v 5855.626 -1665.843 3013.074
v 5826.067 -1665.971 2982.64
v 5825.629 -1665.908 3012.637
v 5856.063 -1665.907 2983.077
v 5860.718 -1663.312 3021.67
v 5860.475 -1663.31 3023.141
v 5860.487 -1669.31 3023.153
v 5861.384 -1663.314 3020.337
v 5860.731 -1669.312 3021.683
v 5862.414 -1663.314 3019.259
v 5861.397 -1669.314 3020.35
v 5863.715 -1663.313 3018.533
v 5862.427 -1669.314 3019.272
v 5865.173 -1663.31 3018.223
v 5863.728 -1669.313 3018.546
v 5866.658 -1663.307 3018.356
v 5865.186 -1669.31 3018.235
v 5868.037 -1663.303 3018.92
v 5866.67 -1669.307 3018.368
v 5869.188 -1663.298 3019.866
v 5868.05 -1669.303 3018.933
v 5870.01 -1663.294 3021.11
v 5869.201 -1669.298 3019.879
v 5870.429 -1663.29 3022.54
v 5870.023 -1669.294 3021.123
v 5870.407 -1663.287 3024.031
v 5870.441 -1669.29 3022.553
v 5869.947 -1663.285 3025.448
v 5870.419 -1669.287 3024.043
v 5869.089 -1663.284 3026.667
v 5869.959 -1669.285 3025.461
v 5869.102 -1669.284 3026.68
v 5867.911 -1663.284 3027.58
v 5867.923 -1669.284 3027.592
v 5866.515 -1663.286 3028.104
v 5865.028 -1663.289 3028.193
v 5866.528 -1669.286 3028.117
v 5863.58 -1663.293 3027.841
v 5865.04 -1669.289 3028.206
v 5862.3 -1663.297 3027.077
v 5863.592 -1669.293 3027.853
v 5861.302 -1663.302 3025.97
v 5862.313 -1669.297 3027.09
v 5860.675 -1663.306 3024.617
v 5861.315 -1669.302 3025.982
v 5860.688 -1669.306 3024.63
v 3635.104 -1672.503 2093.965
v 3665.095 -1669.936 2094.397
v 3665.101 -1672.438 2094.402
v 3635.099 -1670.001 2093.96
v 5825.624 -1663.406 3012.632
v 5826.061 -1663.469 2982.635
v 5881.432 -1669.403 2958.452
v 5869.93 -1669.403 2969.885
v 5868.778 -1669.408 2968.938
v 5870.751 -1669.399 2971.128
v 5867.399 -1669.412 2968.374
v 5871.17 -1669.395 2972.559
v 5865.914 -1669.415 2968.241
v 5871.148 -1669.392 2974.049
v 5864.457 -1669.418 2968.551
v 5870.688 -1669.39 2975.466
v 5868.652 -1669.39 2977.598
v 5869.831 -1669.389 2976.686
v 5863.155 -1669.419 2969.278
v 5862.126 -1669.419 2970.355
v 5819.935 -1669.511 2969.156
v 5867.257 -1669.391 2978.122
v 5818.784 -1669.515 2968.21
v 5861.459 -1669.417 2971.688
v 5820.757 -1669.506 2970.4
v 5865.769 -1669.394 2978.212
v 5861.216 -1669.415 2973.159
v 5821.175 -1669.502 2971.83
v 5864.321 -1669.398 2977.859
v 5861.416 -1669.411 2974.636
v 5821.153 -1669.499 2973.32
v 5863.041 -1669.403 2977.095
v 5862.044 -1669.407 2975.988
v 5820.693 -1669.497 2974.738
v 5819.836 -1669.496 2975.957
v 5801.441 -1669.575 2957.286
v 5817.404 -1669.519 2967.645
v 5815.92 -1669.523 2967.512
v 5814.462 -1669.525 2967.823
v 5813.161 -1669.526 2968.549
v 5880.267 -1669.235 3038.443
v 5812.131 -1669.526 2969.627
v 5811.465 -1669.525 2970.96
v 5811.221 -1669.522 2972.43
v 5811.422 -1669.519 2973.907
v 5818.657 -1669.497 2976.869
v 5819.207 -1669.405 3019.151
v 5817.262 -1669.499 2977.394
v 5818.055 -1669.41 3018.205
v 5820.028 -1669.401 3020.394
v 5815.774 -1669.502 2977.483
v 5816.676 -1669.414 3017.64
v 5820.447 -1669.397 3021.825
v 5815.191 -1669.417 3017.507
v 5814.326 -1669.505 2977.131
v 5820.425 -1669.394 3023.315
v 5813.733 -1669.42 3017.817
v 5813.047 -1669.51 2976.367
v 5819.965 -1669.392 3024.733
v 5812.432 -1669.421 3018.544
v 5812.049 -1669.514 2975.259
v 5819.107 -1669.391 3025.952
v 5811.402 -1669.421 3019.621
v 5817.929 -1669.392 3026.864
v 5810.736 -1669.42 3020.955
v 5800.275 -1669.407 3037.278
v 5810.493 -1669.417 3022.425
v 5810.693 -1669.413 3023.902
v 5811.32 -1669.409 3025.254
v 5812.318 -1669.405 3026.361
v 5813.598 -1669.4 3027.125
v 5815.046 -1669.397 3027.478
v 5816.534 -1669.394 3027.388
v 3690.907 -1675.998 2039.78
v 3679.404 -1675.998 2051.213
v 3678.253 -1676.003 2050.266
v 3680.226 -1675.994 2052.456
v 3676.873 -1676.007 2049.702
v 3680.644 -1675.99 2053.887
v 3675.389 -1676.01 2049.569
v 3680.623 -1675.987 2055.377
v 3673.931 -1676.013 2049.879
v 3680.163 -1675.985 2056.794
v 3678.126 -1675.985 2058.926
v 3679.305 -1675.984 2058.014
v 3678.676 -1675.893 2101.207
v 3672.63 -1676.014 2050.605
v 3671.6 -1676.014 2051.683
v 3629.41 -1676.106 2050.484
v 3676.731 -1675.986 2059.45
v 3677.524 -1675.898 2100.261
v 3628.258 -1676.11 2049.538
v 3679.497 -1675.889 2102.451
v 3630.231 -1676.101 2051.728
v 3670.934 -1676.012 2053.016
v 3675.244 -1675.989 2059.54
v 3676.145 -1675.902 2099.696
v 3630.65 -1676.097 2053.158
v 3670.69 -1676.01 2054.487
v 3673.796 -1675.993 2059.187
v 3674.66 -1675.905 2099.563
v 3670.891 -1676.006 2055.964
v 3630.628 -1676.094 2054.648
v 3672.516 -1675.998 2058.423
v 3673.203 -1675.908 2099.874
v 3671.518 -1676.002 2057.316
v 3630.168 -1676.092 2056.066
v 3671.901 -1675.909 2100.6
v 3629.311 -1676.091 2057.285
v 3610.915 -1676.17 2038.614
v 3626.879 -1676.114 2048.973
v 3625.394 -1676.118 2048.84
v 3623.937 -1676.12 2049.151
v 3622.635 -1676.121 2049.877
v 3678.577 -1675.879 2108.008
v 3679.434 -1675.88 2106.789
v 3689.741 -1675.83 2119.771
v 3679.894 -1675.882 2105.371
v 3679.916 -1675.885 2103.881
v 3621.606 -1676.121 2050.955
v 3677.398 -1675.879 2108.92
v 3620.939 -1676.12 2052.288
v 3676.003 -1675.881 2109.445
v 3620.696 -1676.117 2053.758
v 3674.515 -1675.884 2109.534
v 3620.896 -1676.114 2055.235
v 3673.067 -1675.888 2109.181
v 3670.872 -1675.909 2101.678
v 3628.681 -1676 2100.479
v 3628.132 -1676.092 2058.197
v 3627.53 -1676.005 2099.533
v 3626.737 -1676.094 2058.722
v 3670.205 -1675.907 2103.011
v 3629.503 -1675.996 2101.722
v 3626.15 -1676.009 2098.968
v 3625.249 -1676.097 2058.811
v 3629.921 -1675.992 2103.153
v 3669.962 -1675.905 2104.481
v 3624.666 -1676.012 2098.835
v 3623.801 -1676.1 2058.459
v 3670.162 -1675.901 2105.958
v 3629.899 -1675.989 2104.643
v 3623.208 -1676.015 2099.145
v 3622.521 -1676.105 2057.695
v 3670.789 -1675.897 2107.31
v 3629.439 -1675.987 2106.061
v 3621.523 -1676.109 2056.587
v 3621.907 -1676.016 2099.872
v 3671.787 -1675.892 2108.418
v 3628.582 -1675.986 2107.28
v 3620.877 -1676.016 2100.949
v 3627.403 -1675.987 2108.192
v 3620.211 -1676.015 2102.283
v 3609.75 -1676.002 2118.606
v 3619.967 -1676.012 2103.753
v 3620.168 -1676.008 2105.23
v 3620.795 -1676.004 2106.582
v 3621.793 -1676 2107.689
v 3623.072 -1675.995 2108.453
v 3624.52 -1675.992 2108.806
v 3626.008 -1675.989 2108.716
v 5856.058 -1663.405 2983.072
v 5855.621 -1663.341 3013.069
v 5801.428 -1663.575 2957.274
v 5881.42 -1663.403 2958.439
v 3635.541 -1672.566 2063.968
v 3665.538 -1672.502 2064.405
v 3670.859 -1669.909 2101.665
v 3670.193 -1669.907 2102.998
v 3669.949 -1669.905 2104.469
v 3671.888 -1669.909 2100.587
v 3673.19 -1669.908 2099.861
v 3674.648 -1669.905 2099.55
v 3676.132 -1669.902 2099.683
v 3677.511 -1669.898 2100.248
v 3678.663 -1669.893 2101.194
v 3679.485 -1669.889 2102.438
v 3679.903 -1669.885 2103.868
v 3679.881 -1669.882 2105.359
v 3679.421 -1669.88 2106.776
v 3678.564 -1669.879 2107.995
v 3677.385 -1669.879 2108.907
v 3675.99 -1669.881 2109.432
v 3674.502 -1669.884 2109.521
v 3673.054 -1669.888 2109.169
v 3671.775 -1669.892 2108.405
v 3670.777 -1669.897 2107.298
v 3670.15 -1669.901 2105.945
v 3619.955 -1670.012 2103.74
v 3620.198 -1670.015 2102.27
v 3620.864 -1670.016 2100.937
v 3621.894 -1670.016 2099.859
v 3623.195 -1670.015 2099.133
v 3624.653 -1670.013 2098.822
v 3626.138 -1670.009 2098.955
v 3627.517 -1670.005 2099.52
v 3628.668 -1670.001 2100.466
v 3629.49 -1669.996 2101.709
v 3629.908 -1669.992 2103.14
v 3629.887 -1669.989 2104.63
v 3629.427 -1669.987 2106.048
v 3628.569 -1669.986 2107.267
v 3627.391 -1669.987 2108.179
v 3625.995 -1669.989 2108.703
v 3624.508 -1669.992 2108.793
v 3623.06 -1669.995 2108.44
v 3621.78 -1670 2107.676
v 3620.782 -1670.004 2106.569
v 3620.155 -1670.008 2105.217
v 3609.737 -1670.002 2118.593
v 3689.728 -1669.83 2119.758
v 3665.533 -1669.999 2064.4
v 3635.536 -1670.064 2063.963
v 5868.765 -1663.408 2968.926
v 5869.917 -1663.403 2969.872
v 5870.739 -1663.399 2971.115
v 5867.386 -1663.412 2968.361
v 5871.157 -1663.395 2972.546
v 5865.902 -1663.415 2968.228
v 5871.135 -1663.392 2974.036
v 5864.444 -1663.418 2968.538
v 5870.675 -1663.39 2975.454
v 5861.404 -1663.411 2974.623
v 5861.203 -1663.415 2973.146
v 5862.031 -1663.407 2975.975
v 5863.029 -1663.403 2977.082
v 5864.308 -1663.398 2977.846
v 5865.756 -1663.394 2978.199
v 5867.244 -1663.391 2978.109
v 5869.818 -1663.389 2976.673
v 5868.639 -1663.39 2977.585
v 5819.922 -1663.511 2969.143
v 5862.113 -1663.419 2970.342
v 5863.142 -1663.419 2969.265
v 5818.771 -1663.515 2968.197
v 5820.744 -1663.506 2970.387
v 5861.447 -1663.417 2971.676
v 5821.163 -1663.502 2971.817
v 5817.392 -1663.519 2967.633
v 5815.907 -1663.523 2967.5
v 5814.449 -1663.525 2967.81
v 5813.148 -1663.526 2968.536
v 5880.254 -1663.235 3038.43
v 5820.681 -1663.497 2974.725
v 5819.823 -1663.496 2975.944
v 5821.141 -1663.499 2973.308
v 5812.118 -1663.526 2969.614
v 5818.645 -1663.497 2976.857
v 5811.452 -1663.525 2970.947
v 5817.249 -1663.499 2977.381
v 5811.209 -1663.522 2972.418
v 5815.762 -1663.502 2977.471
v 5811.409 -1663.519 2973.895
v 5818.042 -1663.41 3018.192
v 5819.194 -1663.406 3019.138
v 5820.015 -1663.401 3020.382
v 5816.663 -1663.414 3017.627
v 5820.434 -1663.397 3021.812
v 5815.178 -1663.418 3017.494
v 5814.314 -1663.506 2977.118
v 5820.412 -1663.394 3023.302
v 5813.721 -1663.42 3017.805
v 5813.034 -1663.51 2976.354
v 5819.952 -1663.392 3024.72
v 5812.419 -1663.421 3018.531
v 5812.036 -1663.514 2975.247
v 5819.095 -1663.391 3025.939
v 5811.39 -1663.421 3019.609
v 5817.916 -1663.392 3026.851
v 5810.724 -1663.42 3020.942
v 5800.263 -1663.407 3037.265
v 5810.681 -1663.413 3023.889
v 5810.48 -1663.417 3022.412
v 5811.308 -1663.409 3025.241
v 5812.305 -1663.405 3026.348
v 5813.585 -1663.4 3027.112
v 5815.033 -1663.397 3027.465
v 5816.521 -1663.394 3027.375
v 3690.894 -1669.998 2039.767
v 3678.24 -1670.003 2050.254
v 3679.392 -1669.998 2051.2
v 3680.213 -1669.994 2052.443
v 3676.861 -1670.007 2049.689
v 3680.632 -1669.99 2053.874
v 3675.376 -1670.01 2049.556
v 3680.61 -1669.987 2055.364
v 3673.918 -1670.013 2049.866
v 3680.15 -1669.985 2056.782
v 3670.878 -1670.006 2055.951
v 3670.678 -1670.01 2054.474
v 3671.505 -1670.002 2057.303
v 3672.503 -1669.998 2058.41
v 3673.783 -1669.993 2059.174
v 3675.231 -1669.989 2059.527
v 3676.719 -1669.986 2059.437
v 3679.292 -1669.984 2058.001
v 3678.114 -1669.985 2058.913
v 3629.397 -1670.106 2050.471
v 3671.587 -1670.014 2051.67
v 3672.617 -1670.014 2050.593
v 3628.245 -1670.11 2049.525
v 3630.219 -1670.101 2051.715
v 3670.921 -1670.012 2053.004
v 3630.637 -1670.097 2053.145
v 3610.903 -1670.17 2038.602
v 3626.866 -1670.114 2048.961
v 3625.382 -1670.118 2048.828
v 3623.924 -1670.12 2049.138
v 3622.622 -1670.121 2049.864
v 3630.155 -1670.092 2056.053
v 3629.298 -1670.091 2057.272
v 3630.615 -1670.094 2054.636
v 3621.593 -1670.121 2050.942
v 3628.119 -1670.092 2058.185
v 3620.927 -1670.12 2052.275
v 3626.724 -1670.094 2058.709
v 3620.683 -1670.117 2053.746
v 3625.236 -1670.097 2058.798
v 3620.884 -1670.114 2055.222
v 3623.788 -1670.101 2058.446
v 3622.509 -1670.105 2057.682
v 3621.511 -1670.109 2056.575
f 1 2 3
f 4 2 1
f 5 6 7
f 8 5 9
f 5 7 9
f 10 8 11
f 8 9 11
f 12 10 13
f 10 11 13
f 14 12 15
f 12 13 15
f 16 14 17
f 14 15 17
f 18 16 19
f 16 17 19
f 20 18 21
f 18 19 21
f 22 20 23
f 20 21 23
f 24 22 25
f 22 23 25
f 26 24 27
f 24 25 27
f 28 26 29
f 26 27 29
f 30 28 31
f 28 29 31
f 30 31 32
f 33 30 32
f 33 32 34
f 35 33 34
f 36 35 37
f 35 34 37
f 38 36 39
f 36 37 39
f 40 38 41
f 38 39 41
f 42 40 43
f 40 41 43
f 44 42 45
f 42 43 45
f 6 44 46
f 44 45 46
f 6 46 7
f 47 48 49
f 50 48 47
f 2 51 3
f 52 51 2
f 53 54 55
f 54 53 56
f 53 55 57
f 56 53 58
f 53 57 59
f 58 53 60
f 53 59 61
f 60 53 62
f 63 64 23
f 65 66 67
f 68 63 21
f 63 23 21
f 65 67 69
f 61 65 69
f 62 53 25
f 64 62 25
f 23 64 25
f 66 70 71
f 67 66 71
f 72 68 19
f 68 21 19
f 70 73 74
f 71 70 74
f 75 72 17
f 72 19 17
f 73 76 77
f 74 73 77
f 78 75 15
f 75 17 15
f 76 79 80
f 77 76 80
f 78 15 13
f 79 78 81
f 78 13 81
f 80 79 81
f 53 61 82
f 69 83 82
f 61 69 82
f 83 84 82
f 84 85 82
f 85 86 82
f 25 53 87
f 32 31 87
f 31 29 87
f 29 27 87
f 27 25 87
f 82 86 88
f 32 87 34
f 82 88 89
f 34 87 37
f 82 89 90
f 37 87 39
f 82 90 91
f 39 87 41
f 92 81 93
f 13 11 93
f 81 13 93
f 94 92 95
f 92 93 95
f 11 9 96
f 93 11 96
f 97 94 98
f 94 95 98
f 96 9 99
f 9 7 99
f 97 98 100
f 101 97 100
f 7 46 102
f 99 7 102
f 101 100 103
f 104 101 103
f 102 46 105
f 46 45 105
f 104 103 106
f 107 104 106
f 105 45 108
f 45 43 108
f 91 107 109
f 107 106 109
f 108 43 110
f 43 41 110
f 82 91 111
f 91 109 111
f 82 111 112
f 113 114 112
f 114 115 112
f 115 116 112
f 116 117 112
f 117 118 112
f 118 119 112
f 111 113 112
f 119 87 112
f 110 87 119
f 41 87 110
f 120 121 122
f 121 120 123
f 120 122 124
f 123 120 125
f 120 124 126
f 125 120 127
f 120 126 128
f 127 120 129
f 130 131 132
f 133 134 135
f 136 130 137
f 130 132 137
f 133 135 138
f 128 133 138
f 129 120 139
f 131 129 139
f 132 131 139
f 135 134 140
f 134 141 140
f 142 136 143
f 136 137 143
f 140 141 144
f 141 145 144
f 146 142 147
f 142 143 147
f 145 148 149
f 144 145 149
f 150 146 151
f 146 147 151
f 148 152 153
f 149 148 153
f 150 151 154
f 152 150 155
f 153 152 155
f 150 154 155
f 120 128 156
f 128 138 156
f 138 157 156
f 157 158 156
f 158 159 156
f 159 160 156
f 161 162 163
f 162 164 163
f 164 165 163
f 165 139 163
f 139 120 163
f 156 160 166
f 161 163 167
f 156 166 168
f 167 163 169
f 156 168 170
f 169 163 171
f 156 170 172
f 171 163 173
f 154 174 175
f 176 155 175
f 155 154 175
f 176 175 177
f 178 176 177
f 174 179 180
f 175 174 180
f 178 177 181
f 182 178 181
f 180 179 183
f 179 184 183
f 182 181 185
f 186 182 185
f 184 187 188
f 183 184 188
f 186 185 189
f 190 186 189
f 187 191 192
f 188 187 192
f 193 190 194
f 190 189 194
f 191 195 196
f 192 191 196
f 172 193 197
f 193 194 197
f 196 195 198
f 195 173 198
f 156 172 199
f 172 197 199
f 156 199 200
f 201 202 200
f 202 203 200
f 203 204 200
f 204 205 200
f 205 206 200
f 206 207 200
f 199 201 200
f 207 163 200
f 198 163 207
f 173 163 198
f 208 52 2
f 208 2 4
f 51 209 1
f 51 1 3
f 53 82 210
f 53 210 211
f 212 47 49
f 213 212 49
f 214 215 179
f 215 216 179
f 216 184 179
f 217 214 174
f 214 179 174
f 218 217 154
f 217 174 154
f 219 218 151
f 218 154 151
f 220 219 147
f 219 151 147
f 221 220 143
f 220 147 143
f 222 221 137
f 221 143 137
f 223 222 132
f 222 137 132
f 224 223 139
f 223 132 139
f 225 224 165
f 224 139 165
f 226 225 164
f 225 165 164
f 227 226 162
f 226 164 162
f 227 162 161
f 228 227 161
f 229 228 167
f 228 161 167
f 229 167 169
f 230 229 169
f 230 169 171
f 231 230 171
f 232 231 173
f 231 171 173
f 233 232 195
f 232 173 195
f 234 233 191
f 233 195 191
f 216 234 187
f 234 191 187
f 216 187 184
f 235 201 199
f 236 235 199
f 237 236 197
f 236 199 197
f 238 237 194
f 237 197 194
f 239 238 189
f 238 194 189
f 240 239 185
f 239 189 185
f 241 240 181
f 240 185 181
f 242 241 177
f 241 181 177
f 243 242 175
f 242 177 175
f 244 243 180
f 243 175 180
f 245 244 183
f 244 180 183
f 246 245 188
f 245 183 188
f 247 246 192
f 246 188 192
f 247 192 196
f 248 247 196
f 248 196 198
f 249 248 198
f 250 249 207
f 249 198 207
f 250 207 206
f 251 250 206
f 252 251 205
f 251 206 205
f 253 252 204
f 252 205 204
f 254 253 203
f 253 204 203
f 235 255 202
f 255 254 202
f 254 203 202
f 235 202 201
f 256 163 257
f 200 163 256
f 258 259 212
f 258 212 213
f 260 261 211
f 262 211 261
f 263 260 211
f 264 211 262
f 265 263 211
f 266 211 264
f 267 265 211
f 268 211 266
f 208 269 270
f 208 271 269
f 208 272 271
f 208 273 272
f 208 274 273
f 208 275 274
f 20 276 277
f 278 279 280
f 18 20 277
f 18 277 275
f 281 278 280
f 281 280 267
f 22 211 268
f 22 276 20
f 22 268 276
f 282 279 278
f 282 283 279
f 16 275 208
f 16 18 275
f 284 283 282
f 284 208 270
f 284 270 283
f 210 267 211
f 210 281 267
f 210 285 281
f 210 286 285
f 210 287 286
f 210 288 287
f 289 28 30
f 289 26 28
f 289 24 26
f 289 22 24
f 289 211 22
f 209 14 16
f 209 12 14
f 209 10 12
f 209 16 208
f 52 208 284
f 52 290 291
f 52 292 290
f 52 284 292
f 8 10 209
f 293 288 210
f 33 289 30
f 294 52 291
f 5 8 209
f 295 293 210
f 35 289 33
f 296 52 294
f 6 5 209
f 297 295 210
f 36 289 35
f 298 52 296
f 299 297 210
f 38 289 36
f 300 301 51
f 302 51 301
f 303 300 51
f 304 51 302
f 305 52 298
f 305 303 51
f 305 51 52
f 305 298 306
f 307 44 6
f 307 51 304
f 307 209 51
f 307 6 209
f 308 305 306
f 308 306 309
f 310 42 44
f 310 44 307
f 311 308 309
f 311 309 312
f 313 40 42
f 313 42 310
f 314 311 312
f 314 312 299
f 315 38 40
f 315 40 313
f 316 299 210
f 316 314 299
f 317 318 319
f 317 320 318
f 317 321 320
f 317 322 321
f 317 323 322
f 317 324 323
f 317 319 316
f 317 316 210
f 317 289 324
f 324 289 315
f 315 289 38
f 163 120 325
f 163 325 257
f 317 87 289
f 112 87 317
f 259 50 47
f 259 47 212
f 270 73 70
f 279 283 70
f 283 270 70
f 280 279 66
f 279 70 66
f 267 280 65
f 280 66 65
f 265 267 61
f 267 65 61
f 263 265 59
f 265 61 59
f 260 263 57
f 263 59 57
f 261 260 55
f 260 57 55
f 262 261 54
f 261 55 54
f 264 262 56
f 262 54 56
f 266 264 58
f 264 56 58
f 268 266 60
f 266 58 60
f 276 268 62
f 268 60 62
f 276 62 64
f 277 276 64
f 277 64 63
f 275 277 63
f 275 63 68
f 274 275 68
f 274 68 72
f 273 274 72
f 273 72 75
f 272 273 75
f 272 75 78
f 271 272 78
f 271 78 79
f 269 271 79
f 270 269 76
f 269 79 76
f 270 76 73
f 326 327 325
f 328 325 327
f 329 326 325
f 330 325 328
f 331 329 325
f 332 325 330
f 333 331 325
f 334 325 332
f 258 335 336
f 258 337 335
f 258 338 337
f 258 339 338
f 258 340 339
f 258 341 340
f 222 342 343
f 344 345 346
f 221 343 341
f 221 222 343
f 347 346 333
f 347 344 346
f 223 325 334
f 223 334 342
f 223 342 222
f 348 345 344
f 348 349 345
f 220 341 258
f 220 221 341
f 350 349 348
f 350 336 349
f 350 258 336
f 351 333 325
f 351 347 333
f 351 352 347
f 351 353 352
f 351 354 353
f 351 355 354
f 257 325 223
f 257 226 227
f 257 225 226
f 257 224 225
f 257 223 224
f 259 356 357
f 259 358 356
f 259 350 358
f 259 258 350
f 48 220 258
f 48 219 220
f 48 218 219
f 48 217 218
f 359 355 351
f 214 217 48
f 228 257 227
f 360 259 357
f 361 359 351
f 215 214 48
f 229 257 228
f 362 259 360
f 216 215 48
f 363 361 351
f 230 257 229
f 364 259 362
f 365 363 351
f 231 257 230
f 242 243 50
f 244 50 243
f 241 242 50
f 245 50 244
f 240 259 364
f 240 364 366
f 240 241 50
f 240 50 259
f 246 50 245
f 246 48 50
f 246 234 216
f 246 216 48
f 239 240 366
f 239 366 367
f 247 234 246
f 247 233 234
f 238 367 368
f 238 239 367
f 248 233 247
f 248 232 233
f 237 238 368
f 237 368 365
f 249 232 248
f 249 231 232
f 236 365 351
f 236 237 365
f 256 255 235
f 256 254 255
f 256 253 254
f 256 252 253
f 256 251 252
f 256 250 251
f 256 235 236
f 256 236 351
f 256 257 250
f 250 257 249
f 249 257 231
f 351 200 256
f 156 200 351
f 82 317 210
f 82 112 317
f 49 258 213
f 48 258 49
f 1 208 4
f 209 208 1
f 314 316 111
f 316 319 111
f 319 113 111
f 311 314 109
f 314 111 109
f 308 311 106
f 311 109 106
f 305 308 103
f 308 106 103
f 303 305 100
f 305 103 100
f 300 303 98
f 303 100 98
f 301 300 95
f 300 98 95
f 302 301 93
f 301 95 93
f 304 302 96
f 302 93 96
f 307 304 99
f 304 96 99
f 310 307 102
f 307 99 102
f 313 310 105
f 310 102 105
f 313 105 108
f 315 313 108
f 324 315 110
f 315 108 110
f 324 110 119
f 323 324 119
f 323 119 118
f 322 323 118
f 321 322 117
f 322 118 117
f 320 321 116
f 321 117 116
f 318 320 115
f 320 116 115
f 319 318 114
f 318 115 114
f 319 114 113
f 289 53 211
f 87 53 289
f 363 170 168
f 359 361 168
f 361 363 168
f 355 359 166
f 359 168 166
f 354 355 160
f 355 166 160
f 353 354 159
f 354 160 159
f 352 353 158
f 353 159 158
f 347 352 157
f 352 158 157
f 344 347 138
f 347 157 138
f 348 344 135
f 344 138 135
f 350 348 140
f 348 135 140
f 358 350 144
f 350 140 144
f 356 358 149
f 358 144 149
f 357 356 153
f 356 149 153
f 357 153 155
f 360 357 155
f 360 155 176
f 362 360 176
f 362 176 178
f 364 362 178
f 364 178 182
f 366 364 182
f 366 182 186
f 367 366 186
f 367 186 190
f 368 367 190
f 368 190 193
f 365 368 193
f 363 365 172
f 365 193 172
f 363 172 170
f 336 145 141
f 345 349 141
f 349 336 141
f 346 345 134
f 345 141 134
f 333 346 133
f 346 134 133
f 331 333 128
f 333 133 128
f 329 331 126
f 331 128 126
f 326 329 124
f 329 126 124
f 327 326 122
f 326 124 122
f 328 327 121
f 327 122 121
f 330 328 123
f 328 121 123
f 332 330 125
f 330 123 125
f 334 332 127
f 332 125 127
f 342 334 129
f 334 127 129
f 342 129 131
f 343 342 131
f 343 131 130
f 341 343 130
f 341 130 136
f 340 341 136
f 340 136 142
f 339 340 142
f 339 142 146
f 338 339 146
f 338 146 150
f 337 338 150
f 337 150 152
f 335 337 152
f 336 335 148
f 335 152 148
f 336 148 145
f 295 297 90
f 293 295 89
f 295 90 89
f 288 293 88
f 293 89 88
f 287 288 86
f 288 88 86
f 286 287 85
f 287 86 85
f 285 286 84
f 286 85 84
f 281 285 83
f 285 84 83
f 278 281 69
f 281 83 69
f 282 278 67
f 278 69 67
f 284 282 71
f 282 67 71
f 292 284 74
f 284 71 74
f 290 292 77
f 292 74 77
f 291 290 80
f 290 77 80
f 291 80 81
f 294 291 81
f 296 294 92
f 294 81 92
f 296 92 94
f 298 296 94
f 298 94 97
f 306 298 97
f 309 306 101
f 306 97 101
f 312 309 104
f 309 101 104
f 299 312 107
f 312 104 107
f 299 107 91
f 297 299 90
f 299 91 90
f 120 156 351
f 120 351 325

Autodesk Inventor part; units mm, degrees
ref_plane "YZ Plane" through (0, 0, 0) normal (1, 0, 0) x (0, 1, 0)
ref_plane "XZ Plane" through (0, 0, 0) normal (0, 1, 0) x (-1, 0, 0)
ref_plane "XY Plane" through (0, 0, 0) normal (0, 0, 1) x (1, 0, 0)
ref_plane "Plano de trabajo1" through (5045.3695, -1674.7645, 1275.4449) normal (-0.0021155, 0.9999955, -0.0021345) x (-0.9998916, -0.0021464, -0.0145673)
sketch "Boceto1" plane through (5045.3695, -1674.7645, 1275.4449) normal (-0.0021155, 0.9999955, -0.0021345) x (-0.9998916, -0.0021464, -0.0145673)
  line L0 (-860.5005, 1150.6528) -> (-860.5005, 1750.6528)
  line L1 (-860.5005, 1750.6528) -> (839.4995, 1750.6528)
  line L2 (-13.7894, 1495.6811) -> (-13.7894, 1723.4426)
  line L3 (-780.5005, 1750.6528) -> (-780.5005, 1670.6528)
  circle A0 centre (-795.5005, 1685.6528) radius 5
  circle A1 centre (-795.5005, 1735.6528) radius 5
  circle A2 centre (-845.5005, 1685.6528) radius 5
  circle A3 centre (-845.5005, 1735.6528) radius 5
  line L4 (-780.5005, 1670.6528) -> (-860.5005, 1670.6528)
  line L5 (1423.1842, 863.9864) -> (1423.1842, -832.9469)
  line L6 (823.1842, 863.9864) -> (1423.1842, 863.9864)
  line L7 (1423.1842, 863.9864) -> (1423.1842, 783.9864)
  line L8 (1423.1842, 783.9864) -> (1343.1842, 783.9864)
  line L9 (1343.1842, 783.9864) -> (1343.1842, 863.9864)
  line L10 (1343.1842, 863.9864) -> (1423.1842, 863.9864)
  circle A4 centre (1408.1842, 848.9864) radius 5
  circle A5 centre (1408.1842, 798.9864) radius 5
  circle A6 centre (1358.1842, 848.9864) radius 5
  circle A7 centre (1358.1842, 798.9864) radius 5
  line L11 (-805.5005, 1695.6528) -> (-835.5005, 1695.6528)
  line L12 (-835.5005, 1695.6528) -> (-835.5005, 1725.6528)
  line L13 (-835.5005, 1725.6528) -> (-805.5005, 1725.6528)
  line L14 (-805.5005, 1725.6528) -> (-805.5005, 1695.6528)
  line L15 (1398.1842, 808.9864) -> (1368.1842, 808.9864)
  line L16 (1368.1842, 808.9864) -> (1368.1842, 838.9864)
  line L17 (1368.1842, 838.9864) -> (1398.1842, 838.9864)
  line L18 (1398.1842, 838.9864) -> (1398.1842, 808.9864)
  point P0 (5059.8075, -1198.2636)
  point P1 (1343.1842, 863.9864)
  point P2 (1423.1842, 783.9864)
  point P3 (-820.5005, 1670.6528)
  point P4 (-805.5005, 1710.6528)
  point P5 (1383.1842, 808.9864)
  dimension "d0" = 1700
  dimension "d1" = 600
  dimension "d17" = 80
  dimension "d18" = 80
  dimension "d21" = 10
  dimension "d22" = 15
  dimension "d23" = 15
  dimension "d35" = 30
  dimension "d36" = 30
  dimension "d37" = 25
  dimension "d38" = 25
  dimension "d39" = 30
  dimension "d40" = 30
  dimension "d41" = 25
  dimension "d42" = 25
  dimension "d45" = 15
  dimension "d46" = 15
  dimension "d47" = 15
  dimension "d48" = 15
  dimension "d49" = 15
  dimension "d50" = 15
  dimension "d51" = 15
extrude "Extrusión1" add sketch "Boceto1" along normal blind 6 contours L0 L1 L3 L4 | L5 L8 L9 L6 | L11 L12 L13 L14 | L15 L16 L17 L18
ref_plane "Plano de trabajo2" through (5045.3568, -1668.7646, 1275.4321) normal (-0.0021155, 0.9999955, -0.0021345) x (0.9998916, 0.0021464, 0.0145673)
sketch "Boceto3" plane through (5045.3568, -1668.7646, 1275.4321) normal (-0.0021155, 0.9999955, -0.0021345) x (0.9998916, 0.0021464, 0.0145673)
  line L0 (805.5005, -1695.6528) -> (835.5005, -1695.6528)
  line L1 (835.5005, -1695.6528) -> (835.5005, -1725.6528)
  line L2 (835.5005, -1725.6528) -> (805.5005, -1725.6528)
  line L3 (805.5005, -1725.6528) -> (805.5005, -1695.6528)
  line L4 (860.5005, -1670.6528) -> (780.5005, -1670.6528) projected
  line L5 (780.5005, -1670.6528) -> (780.5005, -1750.6528) projected
  line L6 (-1398.1842, -808.9864) -> (-1368.1842, -808.9864)
  line L7 (-1368.1842, -808.9864) -> (-1368.1842, -838.9864)
  line L8 (-1368.1842, -838.9864) -> (-1398.1842, -838.9864)
  line L9 (-1398.1842, -838.9864) -> (-1398.1842, -808.9864)
  line L10 (-1343.1842, -863.9864) -> (-1343.1842, -783.9864) projected
  line L11 (-1343.1842, -783.9864) -> (-1423.1842, -783.9864) projected
  point P0 (-5059.8075, 1198.2636)
  point P1 (820.5005, -1670.6528)
  point P2 (820.5005, -1695.6528)
  point P3 (780.5005, -1710.6528)
  point P4 (-1343.1842, -823.9864)
  point P5 (-1368.1842, -823.9864)
  point P6 (-1383.1842, -808.9864)
  dimension "d52" = 30
  dimension "d53" = 30
  dimension "d54" = 25
  dimension "d55" = 25
  dimension "d56" = 30
  dimension "d57" = 30
  dimension "d59" = 25
  dimension "d60" = 25
extrude "Extrusión3" cut sketch "Boceto3" against normal blind 2.5
properties part number "Mesa"
